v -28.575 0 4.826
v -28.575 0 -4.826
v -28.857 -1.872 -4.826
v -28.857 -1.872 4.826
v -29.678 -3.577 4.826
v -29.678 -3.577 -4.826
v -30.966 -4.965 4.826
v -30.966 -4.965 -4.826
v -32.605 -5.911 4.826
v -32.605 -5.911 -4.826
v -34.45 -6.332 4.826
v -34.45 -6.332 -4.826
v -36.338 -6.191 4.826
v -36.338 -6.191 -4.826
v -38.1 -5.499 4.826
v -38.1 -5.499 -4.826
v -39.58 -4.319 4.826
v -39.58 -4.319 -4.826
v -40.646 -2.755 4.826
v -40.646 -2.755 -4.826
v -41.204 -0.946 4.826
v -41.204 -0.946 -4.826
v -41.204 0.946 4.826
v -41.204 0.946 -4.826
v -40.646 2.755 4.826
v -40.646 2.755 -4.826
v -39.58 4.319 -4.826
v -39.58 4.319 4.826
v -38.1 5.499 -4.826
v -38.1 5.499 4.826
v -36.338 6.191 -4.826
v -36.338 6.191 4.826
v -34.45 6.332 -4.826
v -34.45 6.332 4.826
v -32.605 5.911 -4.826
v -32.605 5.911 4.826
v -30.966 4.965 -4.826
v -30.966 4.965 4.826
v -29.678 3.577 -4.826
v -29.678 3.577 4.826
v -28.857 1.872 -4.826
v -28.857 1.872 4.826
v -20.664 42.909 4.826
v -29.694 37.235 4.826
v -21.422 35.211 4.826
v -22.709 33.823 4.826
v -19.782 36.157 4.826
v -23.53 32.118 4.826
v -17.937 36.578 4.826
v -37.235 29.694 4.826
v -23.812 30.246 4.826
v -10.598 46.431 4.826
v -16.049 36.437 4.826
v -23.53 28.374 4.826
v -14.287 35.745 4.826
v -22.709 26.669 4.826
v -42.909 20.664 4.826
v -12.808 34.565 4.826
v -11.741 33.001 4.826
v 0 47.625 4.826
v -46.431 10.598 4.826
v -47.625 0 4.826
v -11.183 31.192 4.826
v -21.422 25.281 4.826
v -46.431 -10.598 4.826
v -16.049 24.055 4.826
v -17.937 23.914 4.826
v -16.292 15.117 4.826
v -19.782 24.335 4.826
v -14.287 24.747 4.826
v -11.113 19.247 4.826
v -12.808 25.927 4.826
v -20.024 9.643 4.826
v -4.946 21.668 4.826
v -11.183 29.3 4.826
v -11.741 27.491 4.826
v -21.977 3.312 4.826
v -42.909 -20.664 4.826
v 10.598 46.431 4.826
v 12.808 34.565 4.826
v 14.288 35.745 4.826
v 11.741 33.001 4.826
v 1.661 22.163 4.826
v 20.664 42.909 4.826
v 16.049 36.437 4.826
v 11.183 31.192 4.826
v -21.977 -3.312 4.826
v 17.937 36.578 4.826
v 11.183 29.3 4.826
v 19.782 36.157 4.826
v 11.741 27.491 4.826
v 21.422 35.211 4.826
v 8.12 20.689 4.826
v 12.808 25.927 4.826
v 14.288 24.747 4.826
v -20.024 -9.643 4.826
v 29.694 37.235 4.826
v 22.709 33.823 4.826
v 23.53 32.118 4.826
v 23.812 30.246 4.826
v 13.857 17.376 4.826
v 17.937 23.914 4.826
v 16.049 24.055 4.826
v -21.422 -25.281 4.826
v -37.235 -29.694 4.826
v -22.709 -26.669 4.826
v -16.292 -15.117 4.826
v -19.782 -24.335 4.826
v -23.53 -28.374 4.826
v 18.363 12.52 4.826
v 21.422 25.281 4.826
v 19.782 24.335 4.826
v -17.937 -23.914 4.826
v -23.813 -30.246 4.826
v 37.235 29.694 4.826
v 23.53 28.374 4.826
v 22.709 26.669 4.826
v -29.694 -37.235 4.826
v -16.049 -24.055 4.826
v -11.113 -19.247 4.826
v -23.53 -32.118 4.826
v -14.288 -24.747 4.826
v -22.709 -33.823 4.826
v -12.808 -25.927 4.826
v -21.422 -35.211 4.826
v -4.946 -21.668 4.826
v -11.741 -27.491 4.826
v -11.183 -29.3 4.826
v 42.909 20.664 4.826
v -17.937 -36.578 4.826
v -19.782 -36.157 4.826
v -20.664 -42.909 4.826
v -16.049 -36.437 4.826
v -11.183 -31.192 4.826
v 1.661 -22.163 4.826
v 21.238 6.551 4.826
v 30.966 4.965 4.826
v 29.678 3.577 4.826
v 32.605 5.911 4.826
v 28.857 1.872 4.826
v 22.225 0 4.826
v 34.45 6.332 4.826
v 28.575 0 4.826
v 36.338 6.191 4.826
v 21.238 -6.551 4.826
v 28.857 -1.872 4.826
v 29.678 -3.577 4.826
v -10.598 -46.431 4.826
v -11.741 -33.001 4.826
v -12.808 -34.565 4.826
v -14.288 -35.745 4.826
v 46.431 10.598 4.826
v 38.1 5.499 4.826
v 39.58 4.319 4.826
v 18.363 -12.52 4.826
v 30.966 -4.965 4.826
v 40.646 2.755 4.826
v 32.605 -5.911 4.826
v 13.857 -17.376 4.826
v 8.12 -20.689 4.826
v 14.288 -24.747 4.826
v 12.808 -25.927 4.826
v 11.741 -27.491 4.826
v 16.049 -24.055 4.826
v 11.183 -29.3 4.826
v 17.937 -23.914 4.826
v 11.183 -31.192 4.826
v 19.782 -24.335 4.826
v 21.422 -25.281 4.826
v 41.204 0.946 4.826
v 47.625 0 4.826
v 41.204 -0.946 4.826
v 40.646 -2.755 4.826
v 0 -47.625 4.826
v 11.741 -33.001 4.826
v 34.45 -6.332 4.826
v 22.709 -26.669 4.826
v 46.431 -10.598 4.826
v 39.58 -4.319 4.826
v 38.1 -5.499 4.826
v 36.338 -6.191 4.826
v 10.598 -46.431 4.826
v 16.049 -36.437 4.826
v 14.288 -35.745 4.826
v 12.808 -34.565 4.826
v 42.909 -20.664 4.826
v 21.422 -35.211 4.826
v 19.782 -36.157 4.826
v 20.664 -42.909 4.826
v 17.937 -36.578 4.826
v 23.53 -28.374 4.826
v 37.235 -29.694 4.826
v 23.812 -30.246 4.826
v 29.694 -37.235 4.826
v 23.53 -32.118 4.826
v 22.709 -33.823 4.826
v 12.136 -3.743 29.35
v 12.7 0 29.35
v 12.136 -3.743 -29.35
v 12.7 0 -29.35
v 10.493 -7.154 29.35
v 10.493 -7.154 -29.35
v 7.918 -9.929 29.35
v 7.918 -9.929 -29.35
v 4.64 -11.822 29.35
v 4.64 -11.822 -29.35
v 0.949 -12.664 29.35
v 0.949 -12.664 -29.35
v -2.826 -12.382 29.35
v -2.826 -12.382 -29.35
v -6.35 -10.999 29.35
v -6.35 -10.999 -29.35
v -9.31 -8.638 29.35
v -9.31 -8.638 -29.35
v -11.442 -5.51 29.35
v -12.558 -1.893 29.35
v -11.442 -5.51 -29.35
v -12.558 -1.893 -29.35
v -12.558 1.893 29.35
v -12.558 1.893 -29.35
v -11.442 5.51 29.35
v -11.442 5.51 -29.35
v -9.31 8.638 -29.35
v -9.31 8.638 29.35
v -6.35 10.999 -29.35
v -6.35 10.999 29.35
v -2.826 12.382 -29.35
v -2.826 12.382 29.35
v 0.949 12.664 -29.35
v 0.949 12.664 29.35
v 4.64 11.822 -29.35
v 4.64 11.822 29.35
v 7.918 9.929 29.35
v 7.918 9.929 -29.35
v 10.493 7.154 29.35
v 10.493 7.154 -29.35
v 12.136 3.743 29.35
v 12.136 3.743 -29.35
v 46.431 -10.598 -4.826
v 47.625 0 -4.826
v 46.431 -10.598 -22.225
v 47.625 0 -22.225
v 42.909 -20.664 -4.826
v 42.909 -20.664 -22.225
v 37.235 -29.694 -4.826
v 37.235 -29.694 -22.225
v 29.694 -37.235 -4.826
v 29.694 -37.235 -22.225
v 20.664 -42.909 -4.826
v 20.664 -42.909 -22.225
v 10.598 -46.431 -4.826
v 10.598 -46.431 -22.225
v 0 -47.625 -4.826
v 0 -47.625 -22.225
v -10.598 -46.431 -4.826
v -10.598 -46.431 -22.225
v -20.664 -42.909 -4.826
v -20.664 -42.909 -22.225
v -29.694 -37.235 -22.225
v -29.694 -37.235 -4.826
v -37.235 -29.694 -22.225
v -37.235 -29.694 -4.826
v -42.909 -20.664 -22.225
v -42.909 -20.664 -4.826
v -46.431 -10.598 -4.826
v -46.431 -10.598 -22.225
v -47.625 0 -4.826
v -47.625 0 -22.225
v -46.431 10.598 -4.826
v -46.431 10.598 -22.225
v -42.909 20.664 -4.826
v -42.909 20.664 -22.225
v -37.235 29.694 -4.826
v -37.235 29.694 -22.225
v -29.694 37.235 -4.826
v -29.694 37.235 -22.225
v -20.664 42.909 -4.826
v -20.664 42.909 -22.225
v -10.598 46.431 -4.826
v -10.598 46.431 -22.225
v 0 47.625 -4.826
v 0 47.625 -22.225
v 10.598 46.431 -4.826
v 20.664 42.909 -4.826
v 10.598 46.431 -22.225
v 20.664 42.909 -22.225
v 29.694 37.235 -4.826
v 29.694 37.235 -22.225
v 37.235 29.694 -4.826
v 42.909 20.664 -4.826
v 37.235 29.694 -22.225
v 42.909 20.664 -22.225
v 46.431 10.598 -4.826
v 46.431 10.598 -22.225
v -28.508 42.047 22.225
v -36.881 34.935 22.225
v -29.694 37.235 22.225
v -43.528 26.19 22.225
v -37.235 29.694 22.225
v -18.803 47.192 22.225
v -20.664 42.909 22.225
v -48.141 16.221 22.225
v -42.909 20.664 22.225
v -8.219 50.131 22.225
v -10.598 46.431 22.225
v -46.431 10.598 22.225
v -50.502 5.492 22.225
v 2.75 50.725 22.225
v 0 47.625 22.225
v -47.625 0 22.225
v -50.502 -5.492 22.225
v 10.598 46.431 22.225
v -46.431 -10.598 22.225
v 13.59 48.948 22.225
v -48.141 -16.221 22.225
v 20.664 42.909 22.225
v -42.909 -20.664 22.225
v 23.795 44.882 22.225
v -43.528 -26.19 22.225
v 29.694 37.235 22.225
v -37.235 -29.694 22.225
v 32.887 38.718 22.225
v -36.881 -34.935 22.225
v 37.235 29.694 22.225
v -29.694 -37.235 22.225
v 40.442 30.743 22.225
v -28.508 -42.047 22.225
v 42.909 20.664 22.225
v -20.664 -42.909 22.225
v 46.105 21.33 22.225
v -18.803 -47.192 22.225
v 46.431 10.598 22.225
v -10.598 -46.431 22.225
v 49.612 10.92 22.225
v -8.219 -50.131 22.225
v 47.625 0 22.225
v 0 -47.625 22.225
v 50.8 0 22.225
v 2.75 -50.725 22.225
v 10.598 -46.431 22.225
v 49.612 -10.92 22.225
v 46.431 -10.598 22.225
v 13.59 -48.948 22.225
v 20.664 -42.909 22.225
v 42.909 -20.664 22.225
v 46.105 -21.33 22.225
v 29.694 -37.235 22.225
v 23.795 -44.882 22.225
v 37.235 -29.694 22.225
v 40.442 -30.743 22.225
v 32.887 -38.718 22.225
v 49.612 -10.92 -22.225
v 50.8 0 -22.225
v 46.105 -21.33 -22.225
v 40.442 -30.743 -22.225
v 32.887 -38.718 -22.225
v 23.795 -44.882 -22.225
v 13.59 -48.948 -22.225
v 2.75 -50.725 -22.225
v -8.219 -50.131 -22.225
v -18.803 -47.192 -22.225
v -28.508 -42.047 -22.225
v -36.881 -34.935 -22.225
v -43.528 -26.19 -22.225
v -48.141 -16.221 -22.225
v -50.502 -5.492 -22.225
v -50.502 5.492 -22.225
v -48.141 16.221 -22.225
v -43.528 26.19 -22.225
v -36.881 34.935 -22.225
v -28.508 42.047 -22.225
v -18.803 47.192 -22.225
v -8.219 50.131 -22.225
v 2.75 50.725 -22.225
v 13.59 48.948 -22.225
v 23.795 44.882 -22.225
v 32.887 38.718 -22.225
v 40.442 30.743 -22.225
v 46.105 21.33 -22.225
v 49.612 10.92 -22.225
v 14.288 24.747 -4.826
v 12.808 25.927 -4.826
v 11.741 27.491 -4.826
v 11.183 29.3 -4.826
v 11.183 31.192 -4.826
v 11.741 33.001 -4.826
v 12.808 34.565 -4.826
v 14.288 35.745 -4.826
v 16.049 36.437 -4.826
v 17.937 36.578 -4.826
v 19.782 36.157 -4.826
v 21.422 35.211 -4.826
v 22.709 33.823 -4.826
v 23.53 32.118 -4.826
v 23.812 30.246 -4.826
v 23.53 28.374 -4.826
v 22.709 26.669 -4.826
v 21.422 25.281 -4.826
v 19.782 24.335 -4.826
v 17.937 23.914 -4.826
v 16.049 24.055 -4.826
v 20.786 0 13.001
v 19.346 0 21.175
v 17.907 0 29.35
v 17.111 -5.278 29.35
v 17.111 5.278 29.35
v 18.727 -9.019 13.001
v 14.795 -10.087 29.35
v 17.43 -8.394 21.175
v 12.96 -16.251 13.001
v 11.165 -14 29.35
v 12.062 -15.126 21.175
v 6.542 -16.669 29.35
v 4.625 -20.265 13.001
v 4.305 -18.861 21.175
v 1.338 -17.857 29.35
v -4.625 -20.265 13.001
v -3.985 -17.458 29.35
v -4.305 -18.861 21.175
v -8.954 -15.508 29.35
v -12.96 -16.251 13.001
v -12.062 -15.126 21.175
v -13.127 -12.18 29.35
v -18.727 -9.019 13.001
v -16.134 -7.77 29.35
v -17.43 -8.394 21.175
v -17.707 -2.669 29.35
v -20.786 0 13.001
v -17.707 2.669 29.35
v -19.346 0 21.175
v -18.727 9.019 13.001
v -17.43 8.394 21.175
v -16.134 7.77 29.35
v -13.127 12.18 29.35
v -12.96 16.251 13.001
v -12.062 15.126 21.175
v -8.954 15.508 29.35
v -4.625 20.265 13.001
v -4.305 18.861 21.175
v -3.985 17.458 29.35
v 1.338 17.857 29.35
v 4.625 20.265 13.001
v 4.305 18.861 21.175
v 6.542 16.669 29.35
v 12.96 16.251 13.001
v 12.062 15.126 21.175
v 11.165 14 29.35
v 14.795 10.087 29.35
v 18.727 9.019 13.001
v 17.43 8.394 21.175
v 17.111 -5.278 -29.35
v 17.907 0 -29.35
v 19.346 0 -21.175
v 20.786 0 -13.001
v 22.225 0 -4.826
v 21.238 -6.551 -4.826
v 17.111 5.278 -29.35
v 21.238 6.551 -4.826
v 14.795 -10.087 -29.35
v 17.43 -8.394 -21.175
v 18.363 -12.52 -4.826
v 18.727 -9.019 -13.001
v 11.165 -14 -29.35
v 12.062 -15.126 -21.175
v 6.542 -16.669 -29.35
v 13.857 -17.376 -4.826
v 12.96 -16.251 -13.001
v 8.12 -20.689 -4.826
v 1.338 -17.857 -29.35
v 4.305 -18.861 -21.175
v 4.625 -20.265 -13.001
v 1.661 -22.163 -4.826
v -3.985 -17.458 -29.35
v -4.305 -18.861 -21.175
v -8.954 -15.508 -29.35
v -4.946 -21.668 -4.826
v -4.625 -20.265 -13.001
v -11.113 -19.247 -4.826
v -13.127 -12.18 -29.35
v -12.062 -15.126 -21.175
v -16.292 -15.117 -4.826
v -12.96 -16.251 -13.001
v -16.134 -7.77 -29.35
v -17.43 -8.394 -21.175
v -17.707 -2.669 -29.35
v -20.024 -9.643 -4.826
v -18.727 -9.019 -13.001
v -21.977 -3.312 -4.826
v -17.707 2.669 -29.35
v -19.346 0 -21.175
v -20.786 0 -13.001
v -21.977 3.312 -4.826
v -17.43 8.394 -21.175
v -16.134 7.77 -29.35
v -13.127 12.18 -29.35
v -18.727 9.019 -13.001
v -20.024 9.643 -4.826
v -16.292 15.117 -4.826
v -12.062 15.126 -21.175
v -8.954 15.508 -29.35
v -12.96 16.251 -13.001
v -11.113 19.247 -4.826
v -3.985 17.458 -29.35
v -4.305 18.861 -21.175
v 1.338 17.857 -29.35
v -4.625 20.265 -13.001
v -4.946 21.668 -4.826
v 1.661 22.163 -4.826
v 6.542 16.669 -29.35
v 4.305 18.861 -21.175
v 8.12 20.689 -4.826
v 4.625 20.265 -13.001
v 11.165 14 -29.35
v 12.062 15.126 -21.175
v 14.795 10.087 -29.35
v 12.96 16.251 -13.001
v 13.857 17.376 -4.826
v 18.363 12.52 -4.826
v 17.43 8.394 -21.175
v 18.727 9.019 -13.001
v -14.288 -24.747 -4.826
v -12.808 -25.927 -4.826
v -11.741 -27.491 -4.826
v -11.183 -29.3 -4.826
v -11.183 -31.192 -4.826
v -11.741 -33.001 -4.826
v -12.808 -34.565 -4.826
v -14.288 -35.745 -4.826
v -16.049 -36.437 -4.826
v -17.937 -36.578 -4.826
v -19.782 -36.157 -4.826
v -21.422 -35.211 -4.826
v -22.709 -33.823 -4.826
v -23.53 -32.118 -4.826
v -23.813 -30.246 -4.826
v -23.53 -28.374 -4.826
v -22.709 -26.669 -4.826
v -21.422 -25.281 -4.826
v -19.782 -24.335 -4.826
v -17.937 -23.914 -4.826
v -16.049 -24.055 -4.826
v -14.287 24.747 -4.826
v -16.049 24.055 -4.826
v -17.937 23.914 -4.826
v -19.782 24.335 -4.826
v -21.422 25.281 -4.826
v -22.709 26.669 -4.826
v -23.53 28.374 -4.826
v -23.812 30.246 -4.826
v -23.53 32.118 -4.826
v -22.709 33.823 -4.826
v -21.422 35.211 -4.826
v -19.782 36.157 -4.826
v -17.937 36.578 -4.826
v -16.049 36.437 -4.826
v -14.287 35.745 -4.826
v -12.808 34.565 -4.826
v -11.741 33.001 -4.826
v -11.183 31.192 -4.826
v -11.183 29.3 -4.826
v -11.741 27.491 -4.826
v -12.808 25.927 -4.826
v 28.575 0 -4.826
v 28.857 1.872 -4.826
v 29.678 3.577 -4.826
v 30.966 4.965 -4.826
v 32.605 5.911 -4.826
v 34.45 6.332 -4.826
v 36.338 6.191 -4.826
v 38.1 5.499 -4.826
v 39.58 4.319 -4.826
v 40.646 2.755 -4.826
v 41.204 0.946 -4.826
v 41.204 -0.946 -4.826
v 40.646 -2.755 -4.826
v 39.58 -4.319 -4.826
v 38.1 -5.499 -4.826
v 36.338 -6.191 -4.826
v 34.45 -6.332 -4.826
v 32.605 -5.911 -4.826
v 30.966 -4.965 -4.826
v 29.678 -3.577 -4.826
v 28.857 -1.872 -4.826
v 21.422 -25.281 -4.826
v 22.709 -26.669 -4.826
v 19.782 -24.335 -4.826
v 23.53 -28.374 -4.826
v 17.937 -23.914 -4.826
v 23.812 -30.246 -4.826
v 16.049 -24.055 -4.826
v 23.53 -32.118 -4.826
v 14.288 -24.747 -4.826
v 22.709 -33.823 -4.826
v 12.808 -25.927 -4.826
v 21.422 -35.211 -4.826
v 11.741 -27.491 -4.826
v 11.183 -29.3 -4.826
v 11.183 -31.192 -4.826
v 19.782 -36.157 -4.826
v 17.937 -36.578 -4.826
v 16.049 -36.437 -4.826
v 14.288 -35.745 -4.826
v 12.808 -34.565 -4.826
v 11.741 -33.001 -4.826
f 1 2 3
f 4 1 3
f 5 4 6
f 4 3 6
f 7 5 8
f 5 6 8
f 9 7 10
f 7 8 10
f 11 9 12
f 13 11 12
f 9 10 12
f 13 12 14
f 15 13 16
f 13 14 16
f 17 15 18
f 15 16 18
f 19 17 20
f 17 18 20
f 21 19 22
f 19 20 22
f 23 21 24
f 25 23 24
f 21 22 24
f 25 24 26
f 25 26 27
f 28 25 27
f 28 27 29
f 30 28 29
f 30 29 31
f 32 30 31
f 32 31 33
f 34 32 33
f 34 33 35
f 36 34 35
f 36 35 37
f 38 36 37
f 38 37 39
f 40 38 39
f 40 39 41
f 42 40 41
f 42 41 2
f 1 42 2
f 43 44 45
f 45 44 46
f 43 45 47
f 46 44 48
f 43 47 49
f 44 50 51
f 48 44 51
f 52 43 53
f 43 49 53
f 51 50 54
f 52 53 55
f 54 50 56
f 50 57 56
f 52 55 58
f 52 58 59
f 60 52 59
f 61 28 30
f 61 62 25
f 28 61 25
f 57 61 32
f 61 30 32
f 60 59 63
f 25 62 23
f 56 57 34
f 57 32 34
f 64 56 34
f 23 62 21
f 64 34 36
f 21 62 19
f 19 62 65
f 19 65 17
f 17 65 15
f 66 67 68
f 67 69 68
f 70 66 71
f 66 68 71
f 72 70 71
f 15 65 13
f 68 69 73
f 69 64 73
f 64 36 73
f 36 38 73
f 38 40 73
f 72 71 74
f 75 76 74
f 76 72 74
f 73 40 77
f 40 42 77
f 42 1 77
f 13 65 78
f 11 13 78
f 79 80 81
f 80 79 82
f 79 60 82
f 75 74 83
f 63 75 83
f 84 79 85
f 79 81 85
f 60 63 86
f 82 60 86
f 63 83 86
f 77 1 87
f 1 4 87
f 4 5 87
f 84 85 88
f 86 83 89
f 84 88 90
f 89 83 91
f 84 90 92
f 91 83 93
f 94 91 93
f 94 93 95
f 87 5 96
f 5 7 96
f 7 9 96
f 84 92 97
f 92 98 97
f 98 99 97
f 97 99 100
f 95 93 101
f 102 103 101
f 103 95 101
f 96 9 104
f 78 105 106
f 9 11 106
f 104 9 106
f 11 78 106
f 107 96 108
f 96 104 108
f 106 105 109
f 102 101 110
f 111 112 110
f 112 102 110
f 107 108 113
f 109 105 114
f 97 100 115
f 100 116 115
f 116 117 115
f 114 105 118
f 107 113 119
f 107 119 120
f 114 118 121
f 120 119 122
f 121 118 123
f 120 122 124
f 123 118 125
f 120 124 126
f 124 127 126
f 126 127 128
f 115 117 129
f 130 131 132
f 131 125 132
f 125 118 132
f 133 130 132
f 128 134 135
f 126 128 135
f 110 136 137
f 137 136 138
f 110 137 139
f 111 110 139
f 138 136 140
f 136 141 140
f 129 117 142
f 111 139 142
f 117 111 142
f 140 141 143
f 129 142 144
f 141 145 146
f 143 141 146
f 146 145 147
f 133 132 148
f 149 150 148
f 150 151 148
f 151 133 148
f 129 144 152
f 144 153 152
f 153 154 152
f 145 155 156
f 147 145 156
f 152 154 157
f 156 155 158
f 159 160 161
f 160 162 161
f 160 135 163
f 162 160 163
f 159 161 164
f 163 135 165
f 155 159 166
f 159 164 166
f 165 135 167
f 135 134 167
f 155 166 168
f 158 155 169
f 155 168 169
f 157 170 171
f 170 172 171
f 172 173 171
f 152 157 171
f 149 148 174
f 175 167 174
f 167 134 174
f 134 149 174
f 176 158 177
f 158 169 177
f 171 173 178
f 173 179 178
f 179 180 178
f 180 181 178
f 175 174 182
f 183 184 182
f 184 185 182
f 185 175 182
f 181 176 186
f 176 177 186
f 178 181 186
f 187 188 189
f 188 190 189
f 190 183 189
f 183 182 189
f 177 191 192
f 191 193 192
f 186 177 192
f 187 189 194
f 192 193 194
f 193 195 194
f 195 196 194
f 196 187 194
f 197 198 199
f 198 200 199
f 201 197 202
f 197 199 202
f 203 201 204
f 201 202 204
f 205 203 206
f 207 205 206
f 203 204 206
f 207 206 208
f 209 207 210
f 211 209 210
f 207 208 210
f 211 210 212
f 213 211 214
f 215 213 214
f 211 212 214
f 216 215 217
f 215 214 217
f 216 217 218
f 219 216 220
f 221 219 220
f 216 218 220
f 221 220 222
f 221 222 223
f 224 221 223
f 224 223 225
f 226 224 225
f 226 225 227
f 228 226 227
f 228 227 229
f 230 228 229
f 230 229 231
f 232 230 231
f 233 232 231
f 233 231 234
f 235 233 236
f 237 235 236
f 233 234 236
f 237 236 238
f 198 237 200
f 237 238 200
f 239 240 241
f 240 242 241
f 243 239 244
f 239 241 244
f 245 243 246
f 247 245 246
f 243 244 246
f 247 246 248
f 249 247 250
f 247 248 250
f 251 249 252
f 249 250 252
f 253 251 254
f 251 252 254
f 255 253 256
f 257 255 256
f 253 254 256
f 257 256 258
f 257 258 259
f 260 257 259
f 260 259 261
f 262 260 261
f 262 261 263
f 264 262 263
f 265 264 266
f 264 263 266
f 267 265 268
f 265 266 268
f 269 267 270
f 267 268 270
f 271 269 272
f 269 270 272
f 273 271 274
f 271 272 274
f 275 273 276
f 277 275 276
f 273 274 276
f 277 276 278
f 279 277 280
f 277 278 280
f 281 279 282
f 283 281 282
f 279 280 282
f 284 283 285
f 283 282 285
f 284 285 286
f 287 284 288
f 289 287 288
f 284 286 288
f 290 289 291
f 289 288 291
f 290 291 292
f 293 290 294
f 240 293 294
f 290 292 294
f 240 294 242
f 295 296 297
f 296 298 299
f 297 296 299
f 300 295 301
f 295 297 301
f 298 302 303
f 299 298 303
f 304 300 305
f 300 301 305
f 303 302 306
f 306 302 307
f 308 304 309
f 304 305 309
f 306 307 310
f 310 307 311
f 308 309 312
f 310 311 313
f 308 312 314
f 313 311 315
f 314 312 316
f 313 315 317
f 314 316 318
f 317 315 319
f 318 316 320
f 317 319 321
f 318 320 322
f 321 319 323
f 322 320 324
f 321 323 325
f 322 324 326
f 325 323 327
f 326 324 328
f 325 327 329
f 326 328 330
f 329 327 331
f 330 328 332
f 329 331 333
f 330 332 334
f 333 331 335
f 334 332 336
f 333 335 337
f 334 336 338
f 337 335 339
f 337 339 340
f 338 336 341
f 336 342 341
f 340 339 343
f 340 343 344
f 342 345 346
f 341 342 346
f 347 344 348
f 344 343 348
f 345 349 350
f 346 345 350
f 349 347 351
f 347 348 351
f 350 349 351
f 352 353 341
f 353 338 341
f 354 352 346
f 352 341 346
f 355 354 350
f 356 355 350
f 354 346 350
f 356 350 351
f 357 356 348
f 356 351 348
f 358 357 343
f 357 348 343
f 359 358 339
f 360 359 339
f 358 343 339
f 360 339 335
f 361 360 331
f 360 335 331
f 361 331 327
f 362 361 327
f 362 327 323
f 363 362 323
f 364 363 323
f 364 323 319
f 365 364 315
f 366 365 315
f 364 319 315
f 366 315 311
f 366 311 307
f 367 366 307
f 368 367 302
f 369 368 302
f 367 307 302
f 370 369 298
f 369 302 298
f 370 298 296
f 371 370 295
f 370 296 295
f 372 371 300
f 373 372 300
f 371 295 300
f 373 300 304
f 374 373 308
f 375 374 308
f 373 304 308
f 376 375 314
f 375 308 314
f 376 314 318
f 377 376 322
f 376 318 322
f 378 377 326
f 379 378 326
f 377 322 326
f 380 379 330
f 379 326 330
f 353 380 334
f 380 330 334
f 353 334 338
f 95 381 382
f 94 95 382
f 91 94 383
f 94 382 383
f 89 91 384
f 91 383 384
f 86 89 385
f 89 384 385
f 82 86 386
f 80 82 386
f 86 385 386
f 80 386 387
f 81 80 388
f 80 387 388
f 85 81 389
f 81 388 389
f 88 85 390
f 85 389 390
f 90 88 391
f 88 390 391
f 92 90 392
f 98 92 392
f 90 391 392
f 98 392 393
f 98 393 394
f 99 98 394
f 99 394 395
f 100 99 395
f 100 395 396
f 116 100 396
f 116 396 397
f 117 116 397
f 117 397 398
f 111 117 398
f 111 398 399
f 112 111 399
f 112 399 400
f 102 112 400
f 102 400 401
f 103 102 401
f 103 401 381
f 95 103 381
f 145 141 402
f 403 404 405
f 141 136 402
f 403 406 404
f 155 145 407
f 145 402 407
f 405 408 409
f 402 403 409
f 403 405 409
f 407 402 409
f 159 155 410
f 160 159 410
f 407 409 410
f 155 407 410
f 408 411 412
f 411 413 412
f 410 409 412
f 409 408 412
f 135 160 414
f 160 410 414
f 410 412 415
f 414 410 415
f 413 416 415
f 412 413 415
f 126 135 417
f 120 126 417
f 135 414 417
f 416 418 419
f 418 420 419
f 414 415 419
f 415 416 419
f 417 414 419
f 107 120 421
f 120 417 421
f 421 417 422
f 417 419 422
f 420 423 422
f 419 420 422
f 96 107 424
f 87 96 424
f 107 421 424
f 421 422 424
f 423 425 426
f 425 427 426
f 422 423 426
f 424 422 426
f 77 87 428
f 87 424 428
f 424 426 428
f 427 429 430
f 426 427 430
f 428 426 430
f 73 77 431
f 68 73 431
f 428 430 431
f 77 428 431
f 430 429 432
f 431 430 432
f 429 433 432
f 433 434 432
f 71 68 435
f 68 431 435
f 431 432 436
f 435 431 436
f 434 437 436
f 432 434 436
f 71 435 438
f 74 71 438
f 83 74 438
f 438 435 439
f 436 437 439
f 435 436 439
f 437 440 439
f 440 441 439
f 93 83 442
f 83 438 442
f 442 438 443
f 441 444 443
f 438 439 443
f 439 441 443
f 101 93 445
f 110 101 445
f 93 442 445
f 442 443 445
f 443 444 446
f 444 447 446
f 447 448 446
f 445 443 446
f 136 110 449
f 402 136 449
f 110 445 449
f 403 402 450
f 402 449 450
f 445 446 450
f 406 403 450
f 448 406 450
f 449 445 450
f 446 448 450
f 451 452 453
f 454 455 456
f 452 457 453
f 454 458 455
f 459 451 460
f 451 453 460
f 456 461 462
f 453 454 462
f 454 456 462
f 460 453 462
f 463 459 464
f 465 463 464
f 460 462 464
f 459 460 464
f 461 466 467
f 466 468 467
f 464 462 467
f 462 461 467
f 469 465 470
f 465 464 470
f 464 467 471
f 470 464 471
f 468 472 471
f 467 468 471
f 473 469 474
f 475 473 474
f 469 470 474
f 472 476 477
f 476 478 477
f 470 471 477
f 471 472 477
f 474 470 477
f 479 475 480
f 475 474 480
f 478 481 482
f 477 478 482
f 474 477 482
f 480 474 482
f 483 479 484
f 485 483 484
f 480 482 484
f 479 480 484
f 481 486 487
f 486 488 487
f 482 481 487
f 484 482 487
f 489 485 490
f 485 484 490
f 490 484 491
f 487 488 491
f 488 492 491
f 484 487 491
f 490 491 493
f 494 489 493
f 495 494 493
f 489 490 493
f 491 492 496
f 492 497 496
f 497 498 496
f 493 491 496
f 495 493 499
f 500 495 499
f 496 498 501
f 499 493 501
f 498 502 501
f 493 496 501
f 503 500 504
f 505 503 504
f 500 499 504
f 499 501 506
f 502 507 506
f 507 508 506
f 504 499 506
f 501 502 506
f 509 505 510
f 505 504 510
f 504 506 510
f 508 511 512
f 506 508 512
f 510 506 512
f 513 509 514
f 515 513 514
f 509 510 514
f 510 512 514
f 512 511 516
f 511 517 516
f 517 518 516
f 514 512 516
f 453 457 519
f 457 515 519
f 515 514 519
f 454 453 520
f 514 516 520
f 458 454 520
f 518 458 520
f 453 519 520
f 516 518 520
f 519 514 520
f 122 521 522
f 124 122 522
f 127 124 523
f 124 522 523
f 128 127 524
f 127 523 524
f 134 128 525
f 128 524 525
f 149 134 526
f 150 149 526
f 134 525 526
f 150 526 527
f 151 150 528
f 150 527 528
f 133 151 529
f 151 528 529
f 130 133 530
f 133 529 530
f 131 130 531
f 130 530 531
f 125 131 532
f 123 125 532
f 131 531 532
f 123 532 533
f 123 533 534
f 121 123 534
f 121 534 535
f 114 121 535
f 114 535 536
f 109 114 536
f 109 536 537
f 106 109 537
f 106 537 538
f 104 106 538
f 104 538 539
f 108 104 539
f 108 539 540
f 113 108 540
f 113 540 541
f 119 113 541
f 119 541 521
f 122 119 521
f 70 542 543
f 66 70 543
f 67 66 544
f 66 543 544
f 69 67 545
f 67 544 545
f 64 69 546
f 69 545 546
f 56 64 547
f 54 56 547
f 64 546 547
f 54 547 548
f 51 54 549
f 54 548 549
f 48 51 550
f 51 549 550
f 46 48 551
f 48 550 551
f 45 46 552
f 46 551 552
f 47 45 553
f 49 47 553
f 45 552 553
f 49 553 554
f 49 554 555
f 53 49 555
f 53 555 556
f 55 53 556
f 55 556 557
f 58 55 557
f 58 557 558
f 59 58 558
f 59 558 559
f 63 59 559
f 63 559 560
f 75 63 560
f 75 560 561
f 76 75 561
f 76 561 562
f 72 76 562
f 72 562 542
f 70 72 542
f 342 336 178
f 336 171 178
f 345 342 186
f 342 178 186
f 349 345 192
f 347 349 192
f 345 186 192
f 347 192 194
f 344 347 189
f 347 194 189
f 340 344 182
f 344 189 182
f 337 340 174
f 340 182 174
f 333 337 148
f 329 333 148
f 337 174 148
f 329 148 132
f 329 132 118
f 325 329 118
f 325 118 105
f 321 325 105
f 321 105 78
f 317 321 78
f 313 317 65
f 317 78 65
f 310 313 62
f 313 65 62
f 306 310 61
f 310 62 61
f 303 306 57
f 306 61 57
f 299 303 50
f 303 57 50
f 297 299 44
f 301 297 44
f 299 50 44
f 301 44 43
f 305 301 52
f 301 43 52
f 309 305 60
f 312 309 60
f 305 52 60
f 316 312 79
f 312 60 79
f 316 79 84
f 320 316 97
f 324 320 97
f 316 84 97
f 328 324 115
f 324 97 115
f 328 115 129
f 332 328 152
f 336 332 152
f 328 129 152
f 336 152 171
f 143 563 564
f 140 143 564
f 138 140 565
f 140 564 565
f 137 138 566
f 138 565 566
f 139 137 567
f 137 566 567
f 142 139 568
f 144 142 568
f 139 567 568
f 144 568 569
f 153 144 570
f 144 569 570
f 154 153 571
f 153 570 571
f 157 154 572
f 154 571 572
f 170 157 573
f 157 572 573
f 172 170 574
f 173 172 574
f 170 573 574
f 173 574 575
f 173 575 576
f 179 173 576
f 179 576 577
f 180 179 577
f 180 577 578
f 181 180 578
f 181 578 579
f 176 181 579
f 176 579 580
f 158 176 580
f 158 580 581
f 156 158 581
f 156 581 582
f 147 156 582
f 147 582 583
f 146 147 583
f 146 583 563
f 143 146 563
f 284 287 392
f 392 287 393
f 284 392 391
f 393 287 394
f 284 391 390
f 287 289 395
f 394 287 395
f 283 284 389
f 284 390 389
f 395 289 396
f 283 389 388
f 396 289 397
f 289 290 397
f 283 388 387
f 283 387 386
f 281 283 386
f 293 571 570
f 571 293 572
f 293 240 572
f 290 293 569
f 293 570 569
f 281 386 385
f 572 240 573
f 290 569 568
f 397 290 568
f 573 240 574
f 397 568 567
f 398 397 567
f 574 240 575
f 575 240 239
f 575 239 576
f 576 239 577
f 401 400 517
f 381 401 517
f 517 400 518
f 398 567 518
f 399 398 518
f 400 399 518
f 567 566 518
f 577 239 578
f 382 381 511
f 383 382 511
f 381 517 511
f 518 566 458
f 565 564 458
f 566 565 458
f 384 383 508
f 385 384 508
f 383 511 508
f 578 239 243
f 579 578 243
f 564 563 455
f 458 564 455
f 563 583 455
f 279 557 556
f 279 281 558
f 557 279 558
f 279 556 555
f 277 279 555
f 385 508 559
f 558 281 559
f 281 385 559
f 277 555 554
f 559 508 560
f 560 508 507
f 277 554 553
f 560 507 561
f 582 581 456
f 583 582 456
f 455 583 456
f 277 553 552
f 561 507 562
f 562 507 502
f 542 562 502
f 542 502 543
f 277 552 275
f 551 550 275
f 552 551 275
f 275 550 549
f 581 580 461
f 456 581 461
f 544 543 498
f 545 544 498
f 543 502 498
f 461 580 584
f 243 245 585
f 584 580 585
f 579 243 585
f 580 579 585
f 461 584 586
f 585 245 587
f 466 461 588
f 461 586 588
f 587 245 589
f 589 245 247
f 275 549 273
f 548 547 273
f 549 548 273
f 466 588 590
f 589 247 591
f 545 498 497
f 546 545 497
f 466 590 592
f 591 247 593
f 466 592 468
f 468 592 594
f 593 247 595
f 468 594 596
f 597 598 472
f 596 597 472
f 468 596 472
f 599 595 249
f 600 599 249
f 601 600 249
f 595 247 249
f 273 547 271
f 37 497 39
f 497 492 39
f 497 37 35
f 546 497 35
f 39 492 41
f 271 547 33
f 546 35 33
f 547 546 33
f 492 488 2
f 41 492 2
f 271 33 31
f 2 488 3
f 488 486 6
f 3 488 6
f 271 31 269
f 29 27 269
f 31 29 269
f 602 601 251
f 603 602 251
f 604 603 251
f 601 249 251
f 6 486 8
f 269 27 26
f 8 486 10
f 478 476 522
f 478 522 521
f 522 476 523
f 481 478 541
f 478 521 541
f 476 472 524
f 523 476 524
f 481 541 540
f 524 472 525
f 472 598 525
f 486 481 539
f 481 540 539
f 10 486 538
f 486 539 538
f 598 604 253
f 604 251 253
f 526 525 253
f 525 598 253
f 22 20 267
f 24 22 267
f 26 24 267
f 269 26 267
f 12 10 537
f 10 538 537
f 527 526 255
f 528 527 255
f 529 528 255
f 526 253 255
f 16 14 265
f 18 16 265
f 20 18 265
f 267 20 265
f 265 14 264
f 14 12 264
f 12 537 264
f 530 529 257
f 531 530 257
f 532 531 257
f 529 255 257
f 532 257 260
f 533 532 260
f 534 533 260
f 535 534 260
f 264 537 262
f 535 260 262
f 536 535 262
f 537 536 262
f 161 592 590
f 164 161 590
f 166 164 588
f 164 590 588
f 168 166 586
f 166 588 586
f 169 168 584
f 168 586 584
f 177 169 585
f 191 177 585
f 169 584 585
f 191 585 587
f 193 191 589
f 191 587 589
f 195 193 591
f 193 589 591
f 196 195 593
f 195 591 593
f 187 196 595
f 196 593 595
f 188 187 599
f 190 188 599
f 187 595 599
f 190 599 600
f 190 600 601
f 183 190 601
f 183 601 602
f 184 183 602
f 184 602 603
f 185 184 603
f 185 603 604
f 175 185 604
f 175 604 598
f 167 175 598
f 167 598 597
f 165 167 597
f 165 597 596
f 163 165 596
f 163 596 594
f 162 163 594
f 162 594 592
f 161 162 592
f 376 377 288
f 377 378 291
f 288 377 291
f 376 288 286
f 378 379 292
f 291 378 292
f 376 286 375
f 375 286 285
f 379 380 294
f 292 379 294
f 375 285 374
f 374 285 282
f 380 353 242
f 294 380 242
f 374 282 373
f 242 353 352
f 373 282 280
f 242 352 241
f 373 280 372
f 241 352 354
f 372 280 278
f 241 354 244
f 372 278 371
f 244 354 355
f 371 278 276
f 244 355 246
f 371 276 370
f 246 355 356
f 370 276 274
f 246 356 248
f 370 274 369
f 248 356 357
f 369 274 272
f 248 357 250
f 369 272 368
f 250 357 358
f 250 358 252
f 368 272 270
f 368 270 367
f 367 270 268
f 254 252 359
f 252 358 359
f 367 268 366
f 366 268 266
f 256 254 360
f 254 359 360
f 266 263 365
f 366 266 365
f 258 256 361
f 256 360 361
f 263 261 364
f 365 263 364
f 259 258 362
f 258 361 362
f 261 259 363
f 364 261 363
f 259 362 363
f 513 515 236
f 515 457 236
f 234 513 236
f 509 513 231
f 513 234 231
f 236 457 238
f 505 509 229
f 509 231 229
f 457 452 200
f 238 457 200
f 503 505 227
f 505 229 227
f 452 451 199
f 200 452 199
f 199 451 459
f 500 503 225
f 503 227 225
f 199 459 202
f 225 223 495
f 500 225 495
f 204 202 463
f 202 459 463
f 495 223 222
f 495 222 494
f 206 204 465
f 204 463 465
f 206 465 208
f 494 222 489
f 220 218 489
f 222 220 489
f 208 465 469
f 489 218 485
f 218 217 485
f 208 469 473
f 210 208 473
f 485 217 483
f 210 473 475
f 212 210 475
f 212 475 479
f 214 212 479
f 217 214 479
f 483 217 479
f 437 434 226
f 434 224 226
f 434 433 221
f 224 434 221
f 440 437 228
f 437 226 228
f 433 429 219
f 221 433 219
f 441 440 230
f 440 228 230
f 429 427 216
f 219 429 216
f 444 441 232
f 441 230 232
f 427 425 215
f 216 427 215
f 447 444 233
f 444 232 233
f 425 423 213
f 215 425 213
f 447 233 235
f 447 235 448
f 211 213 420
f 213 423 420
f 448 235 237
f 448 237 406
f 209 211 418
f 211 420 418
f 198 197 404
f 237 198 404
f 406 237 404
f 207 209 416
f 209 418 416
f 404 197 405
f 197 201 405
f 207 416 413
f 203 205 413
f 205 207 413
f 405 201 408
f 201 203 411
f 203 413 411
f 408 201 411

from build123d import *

# Parameters (mm, degrees)
F_3_8_0_5_DIAMETER_HOLE1_D = 12.7
CIRPATTERN1_COUNT          = 6


with BuildPart() as part:
    # Sketch1 → Revolve1 (revolve)
    with BuildSketch(Plane(origin=(0, 0, 0), x_dir=(0, 0, -1), z_dir=(1, 0, 0)), mode=Mode.PRIVATE) as revolve1_sk:
        Polygon((-29.3497, 12.7), (29.3497, 12.7), (29.3497, 17.907), (4.826, 22.225), (4.826, 47.625), (22.225, 47.625), (22.225, 50.8), (-22.225, 50.8), (-22.225, 47.625), (-4.826, 47.625), (-4.826, 22.225), (-29.3497, 17.907), align=None)
    revolve(revolve1_sk.sketch.rotate(Axis((0, 0, 50.332885059), (0, 0, -1)), 90), axis=Axis((0, 0, 50.332885059), (0, 0, -1)))

    # 3/8 (0.5) Diameter Hole1 (through all)
    with Locations(Plane.XY.offset(4.826)):
        with Locations((34.925, 0)):
            f_3_8_0_5_diameter_hole1 = Hole(F_3_8_0_5_DIAMETER_HOLE1_D / 2)

    # CirPattern1: 3/8 (0.5) Diameter Hole1 ×6 about axis
    cirpattern1_axis = Axis((0, 0, 0), (0, 0, 1))
    for i in range(1, CIRPATTERN1_COUNT):
        add(f_3_8_0_5_diameter_hole1.rotate(cirpattern1_axis, i * 360 / CIRPATTERN1_COUNT), mode=Mode.SUBTRACT)


solid = part.part
